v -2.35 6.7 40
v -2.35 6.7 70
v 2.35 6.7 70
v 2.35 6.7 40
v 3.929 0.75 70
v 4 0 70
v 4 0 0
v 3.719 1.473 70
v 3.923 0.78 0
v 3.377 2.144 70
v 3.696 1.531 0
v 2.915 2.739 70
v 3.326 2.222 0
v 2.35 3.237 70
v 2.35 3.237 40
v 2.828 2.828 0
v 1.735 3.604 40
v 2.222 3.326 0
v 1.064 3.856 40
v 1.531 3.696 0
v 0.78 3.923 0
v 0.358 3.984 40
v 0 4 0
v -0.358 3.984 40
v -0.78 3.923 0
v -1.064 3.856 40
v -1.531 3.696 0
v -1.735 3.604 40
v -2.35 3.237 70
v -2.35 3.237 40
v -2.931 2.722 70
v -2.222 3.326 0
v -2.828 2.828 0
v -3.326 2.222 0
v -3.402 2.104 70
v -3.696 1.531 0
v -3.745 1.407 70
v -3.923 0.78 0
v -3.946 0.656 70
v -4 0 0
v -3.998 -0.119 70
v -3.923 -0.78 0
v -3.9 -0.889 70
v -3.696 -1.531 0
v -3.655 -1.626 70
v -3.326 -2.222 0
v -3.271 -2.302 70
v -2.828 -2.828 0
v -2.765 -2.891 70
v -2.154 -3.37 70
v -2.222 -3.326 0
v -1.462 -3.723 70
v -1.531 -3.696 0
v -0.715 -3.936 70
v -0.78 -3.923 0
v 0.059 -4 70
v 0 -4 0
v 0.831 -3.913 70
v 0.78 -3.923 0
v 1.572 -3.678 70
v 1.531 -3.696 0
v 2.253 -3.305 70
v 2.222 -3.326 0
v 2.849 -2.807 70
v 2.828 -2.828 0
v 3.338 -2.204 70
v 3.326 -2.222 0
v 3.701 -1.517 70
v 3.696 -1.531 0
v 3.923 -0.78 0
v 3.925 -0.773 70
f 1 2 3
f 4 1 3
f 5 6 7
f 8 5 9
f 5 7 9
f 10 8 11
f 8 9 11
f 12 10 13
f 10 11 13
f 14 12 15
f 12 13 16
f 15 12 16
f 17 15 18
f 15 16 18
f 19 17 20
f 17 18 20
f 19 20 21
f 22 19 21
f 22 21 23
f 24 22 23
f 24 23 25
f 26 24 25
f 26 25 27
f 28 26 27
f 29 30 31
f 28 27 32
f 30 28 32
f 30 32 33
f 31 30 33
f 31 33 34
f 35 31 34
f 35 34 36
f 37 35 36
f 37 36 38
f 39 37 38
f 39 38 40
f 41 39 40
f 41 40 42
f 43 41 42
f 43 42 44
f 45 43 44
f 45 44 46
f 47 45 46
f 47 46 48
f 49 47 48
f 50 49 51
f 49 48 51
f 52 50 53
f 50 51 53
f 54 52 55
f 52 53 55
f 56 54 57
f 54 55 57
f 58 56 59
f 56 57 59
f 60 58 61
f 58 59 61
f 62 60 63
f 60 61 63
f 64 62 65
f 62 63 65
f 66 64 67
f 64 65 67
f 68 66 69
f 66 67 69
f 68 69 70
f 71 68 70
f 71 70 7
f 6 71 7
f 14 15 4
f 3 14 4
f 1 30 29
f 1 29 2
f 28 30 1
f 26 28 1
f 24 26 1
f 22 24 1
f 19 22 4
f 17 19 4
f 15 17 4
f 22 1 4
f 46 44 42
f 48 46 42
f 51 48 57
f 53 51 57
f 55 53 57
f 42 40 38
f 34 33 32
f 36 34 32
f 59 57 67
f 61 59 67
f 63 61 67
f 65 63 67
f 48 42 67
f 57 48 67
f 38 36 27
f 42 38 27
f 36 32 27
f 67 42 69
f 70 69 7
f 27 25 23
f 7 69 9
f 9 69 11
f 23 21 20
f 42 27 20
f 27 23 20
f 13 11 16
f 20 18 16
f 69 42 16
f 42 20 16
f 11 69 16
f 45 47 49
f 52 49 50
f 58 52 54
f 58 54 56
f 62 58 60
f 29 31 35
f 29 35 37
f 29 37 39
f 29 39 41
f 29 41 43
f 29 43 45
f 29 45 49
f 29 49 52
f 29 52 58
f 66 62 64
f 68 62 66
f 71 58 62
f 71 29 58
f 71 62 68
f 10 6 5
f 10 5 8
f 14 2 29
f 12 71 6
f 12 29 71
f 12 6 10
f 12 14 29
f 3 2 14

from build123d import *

# Parameters (mm, degrees)
SKETCH1_R           = 4
BOSS_EXTRUDE1_DEPTH = 70
SKETCH2_W           = 4.7
SKETCH2_H           = 5.4
BOSS_EXTRUDE4_DEPTH = 30


with BuildPart() as part:
    # Sketch1 → Boss-Extrude1 (new body)
    with BuildSketch(Plane.XY):
        Circle(SKETCH1_R)
    extrude(amount=BOSS_EXTRUDE1_DEPTH)

    # Sketch2 → Boss-Extrude4 (add)
    with BuildSketch(Plane.XY.offset(70)):
        with Locations((0, 4)):
            Rectangle(SKETCH2_W, SKETCH2_H)
    extrude(amount=-BOSS_EXTRUDE4_DEPTH)


solid = part.part
